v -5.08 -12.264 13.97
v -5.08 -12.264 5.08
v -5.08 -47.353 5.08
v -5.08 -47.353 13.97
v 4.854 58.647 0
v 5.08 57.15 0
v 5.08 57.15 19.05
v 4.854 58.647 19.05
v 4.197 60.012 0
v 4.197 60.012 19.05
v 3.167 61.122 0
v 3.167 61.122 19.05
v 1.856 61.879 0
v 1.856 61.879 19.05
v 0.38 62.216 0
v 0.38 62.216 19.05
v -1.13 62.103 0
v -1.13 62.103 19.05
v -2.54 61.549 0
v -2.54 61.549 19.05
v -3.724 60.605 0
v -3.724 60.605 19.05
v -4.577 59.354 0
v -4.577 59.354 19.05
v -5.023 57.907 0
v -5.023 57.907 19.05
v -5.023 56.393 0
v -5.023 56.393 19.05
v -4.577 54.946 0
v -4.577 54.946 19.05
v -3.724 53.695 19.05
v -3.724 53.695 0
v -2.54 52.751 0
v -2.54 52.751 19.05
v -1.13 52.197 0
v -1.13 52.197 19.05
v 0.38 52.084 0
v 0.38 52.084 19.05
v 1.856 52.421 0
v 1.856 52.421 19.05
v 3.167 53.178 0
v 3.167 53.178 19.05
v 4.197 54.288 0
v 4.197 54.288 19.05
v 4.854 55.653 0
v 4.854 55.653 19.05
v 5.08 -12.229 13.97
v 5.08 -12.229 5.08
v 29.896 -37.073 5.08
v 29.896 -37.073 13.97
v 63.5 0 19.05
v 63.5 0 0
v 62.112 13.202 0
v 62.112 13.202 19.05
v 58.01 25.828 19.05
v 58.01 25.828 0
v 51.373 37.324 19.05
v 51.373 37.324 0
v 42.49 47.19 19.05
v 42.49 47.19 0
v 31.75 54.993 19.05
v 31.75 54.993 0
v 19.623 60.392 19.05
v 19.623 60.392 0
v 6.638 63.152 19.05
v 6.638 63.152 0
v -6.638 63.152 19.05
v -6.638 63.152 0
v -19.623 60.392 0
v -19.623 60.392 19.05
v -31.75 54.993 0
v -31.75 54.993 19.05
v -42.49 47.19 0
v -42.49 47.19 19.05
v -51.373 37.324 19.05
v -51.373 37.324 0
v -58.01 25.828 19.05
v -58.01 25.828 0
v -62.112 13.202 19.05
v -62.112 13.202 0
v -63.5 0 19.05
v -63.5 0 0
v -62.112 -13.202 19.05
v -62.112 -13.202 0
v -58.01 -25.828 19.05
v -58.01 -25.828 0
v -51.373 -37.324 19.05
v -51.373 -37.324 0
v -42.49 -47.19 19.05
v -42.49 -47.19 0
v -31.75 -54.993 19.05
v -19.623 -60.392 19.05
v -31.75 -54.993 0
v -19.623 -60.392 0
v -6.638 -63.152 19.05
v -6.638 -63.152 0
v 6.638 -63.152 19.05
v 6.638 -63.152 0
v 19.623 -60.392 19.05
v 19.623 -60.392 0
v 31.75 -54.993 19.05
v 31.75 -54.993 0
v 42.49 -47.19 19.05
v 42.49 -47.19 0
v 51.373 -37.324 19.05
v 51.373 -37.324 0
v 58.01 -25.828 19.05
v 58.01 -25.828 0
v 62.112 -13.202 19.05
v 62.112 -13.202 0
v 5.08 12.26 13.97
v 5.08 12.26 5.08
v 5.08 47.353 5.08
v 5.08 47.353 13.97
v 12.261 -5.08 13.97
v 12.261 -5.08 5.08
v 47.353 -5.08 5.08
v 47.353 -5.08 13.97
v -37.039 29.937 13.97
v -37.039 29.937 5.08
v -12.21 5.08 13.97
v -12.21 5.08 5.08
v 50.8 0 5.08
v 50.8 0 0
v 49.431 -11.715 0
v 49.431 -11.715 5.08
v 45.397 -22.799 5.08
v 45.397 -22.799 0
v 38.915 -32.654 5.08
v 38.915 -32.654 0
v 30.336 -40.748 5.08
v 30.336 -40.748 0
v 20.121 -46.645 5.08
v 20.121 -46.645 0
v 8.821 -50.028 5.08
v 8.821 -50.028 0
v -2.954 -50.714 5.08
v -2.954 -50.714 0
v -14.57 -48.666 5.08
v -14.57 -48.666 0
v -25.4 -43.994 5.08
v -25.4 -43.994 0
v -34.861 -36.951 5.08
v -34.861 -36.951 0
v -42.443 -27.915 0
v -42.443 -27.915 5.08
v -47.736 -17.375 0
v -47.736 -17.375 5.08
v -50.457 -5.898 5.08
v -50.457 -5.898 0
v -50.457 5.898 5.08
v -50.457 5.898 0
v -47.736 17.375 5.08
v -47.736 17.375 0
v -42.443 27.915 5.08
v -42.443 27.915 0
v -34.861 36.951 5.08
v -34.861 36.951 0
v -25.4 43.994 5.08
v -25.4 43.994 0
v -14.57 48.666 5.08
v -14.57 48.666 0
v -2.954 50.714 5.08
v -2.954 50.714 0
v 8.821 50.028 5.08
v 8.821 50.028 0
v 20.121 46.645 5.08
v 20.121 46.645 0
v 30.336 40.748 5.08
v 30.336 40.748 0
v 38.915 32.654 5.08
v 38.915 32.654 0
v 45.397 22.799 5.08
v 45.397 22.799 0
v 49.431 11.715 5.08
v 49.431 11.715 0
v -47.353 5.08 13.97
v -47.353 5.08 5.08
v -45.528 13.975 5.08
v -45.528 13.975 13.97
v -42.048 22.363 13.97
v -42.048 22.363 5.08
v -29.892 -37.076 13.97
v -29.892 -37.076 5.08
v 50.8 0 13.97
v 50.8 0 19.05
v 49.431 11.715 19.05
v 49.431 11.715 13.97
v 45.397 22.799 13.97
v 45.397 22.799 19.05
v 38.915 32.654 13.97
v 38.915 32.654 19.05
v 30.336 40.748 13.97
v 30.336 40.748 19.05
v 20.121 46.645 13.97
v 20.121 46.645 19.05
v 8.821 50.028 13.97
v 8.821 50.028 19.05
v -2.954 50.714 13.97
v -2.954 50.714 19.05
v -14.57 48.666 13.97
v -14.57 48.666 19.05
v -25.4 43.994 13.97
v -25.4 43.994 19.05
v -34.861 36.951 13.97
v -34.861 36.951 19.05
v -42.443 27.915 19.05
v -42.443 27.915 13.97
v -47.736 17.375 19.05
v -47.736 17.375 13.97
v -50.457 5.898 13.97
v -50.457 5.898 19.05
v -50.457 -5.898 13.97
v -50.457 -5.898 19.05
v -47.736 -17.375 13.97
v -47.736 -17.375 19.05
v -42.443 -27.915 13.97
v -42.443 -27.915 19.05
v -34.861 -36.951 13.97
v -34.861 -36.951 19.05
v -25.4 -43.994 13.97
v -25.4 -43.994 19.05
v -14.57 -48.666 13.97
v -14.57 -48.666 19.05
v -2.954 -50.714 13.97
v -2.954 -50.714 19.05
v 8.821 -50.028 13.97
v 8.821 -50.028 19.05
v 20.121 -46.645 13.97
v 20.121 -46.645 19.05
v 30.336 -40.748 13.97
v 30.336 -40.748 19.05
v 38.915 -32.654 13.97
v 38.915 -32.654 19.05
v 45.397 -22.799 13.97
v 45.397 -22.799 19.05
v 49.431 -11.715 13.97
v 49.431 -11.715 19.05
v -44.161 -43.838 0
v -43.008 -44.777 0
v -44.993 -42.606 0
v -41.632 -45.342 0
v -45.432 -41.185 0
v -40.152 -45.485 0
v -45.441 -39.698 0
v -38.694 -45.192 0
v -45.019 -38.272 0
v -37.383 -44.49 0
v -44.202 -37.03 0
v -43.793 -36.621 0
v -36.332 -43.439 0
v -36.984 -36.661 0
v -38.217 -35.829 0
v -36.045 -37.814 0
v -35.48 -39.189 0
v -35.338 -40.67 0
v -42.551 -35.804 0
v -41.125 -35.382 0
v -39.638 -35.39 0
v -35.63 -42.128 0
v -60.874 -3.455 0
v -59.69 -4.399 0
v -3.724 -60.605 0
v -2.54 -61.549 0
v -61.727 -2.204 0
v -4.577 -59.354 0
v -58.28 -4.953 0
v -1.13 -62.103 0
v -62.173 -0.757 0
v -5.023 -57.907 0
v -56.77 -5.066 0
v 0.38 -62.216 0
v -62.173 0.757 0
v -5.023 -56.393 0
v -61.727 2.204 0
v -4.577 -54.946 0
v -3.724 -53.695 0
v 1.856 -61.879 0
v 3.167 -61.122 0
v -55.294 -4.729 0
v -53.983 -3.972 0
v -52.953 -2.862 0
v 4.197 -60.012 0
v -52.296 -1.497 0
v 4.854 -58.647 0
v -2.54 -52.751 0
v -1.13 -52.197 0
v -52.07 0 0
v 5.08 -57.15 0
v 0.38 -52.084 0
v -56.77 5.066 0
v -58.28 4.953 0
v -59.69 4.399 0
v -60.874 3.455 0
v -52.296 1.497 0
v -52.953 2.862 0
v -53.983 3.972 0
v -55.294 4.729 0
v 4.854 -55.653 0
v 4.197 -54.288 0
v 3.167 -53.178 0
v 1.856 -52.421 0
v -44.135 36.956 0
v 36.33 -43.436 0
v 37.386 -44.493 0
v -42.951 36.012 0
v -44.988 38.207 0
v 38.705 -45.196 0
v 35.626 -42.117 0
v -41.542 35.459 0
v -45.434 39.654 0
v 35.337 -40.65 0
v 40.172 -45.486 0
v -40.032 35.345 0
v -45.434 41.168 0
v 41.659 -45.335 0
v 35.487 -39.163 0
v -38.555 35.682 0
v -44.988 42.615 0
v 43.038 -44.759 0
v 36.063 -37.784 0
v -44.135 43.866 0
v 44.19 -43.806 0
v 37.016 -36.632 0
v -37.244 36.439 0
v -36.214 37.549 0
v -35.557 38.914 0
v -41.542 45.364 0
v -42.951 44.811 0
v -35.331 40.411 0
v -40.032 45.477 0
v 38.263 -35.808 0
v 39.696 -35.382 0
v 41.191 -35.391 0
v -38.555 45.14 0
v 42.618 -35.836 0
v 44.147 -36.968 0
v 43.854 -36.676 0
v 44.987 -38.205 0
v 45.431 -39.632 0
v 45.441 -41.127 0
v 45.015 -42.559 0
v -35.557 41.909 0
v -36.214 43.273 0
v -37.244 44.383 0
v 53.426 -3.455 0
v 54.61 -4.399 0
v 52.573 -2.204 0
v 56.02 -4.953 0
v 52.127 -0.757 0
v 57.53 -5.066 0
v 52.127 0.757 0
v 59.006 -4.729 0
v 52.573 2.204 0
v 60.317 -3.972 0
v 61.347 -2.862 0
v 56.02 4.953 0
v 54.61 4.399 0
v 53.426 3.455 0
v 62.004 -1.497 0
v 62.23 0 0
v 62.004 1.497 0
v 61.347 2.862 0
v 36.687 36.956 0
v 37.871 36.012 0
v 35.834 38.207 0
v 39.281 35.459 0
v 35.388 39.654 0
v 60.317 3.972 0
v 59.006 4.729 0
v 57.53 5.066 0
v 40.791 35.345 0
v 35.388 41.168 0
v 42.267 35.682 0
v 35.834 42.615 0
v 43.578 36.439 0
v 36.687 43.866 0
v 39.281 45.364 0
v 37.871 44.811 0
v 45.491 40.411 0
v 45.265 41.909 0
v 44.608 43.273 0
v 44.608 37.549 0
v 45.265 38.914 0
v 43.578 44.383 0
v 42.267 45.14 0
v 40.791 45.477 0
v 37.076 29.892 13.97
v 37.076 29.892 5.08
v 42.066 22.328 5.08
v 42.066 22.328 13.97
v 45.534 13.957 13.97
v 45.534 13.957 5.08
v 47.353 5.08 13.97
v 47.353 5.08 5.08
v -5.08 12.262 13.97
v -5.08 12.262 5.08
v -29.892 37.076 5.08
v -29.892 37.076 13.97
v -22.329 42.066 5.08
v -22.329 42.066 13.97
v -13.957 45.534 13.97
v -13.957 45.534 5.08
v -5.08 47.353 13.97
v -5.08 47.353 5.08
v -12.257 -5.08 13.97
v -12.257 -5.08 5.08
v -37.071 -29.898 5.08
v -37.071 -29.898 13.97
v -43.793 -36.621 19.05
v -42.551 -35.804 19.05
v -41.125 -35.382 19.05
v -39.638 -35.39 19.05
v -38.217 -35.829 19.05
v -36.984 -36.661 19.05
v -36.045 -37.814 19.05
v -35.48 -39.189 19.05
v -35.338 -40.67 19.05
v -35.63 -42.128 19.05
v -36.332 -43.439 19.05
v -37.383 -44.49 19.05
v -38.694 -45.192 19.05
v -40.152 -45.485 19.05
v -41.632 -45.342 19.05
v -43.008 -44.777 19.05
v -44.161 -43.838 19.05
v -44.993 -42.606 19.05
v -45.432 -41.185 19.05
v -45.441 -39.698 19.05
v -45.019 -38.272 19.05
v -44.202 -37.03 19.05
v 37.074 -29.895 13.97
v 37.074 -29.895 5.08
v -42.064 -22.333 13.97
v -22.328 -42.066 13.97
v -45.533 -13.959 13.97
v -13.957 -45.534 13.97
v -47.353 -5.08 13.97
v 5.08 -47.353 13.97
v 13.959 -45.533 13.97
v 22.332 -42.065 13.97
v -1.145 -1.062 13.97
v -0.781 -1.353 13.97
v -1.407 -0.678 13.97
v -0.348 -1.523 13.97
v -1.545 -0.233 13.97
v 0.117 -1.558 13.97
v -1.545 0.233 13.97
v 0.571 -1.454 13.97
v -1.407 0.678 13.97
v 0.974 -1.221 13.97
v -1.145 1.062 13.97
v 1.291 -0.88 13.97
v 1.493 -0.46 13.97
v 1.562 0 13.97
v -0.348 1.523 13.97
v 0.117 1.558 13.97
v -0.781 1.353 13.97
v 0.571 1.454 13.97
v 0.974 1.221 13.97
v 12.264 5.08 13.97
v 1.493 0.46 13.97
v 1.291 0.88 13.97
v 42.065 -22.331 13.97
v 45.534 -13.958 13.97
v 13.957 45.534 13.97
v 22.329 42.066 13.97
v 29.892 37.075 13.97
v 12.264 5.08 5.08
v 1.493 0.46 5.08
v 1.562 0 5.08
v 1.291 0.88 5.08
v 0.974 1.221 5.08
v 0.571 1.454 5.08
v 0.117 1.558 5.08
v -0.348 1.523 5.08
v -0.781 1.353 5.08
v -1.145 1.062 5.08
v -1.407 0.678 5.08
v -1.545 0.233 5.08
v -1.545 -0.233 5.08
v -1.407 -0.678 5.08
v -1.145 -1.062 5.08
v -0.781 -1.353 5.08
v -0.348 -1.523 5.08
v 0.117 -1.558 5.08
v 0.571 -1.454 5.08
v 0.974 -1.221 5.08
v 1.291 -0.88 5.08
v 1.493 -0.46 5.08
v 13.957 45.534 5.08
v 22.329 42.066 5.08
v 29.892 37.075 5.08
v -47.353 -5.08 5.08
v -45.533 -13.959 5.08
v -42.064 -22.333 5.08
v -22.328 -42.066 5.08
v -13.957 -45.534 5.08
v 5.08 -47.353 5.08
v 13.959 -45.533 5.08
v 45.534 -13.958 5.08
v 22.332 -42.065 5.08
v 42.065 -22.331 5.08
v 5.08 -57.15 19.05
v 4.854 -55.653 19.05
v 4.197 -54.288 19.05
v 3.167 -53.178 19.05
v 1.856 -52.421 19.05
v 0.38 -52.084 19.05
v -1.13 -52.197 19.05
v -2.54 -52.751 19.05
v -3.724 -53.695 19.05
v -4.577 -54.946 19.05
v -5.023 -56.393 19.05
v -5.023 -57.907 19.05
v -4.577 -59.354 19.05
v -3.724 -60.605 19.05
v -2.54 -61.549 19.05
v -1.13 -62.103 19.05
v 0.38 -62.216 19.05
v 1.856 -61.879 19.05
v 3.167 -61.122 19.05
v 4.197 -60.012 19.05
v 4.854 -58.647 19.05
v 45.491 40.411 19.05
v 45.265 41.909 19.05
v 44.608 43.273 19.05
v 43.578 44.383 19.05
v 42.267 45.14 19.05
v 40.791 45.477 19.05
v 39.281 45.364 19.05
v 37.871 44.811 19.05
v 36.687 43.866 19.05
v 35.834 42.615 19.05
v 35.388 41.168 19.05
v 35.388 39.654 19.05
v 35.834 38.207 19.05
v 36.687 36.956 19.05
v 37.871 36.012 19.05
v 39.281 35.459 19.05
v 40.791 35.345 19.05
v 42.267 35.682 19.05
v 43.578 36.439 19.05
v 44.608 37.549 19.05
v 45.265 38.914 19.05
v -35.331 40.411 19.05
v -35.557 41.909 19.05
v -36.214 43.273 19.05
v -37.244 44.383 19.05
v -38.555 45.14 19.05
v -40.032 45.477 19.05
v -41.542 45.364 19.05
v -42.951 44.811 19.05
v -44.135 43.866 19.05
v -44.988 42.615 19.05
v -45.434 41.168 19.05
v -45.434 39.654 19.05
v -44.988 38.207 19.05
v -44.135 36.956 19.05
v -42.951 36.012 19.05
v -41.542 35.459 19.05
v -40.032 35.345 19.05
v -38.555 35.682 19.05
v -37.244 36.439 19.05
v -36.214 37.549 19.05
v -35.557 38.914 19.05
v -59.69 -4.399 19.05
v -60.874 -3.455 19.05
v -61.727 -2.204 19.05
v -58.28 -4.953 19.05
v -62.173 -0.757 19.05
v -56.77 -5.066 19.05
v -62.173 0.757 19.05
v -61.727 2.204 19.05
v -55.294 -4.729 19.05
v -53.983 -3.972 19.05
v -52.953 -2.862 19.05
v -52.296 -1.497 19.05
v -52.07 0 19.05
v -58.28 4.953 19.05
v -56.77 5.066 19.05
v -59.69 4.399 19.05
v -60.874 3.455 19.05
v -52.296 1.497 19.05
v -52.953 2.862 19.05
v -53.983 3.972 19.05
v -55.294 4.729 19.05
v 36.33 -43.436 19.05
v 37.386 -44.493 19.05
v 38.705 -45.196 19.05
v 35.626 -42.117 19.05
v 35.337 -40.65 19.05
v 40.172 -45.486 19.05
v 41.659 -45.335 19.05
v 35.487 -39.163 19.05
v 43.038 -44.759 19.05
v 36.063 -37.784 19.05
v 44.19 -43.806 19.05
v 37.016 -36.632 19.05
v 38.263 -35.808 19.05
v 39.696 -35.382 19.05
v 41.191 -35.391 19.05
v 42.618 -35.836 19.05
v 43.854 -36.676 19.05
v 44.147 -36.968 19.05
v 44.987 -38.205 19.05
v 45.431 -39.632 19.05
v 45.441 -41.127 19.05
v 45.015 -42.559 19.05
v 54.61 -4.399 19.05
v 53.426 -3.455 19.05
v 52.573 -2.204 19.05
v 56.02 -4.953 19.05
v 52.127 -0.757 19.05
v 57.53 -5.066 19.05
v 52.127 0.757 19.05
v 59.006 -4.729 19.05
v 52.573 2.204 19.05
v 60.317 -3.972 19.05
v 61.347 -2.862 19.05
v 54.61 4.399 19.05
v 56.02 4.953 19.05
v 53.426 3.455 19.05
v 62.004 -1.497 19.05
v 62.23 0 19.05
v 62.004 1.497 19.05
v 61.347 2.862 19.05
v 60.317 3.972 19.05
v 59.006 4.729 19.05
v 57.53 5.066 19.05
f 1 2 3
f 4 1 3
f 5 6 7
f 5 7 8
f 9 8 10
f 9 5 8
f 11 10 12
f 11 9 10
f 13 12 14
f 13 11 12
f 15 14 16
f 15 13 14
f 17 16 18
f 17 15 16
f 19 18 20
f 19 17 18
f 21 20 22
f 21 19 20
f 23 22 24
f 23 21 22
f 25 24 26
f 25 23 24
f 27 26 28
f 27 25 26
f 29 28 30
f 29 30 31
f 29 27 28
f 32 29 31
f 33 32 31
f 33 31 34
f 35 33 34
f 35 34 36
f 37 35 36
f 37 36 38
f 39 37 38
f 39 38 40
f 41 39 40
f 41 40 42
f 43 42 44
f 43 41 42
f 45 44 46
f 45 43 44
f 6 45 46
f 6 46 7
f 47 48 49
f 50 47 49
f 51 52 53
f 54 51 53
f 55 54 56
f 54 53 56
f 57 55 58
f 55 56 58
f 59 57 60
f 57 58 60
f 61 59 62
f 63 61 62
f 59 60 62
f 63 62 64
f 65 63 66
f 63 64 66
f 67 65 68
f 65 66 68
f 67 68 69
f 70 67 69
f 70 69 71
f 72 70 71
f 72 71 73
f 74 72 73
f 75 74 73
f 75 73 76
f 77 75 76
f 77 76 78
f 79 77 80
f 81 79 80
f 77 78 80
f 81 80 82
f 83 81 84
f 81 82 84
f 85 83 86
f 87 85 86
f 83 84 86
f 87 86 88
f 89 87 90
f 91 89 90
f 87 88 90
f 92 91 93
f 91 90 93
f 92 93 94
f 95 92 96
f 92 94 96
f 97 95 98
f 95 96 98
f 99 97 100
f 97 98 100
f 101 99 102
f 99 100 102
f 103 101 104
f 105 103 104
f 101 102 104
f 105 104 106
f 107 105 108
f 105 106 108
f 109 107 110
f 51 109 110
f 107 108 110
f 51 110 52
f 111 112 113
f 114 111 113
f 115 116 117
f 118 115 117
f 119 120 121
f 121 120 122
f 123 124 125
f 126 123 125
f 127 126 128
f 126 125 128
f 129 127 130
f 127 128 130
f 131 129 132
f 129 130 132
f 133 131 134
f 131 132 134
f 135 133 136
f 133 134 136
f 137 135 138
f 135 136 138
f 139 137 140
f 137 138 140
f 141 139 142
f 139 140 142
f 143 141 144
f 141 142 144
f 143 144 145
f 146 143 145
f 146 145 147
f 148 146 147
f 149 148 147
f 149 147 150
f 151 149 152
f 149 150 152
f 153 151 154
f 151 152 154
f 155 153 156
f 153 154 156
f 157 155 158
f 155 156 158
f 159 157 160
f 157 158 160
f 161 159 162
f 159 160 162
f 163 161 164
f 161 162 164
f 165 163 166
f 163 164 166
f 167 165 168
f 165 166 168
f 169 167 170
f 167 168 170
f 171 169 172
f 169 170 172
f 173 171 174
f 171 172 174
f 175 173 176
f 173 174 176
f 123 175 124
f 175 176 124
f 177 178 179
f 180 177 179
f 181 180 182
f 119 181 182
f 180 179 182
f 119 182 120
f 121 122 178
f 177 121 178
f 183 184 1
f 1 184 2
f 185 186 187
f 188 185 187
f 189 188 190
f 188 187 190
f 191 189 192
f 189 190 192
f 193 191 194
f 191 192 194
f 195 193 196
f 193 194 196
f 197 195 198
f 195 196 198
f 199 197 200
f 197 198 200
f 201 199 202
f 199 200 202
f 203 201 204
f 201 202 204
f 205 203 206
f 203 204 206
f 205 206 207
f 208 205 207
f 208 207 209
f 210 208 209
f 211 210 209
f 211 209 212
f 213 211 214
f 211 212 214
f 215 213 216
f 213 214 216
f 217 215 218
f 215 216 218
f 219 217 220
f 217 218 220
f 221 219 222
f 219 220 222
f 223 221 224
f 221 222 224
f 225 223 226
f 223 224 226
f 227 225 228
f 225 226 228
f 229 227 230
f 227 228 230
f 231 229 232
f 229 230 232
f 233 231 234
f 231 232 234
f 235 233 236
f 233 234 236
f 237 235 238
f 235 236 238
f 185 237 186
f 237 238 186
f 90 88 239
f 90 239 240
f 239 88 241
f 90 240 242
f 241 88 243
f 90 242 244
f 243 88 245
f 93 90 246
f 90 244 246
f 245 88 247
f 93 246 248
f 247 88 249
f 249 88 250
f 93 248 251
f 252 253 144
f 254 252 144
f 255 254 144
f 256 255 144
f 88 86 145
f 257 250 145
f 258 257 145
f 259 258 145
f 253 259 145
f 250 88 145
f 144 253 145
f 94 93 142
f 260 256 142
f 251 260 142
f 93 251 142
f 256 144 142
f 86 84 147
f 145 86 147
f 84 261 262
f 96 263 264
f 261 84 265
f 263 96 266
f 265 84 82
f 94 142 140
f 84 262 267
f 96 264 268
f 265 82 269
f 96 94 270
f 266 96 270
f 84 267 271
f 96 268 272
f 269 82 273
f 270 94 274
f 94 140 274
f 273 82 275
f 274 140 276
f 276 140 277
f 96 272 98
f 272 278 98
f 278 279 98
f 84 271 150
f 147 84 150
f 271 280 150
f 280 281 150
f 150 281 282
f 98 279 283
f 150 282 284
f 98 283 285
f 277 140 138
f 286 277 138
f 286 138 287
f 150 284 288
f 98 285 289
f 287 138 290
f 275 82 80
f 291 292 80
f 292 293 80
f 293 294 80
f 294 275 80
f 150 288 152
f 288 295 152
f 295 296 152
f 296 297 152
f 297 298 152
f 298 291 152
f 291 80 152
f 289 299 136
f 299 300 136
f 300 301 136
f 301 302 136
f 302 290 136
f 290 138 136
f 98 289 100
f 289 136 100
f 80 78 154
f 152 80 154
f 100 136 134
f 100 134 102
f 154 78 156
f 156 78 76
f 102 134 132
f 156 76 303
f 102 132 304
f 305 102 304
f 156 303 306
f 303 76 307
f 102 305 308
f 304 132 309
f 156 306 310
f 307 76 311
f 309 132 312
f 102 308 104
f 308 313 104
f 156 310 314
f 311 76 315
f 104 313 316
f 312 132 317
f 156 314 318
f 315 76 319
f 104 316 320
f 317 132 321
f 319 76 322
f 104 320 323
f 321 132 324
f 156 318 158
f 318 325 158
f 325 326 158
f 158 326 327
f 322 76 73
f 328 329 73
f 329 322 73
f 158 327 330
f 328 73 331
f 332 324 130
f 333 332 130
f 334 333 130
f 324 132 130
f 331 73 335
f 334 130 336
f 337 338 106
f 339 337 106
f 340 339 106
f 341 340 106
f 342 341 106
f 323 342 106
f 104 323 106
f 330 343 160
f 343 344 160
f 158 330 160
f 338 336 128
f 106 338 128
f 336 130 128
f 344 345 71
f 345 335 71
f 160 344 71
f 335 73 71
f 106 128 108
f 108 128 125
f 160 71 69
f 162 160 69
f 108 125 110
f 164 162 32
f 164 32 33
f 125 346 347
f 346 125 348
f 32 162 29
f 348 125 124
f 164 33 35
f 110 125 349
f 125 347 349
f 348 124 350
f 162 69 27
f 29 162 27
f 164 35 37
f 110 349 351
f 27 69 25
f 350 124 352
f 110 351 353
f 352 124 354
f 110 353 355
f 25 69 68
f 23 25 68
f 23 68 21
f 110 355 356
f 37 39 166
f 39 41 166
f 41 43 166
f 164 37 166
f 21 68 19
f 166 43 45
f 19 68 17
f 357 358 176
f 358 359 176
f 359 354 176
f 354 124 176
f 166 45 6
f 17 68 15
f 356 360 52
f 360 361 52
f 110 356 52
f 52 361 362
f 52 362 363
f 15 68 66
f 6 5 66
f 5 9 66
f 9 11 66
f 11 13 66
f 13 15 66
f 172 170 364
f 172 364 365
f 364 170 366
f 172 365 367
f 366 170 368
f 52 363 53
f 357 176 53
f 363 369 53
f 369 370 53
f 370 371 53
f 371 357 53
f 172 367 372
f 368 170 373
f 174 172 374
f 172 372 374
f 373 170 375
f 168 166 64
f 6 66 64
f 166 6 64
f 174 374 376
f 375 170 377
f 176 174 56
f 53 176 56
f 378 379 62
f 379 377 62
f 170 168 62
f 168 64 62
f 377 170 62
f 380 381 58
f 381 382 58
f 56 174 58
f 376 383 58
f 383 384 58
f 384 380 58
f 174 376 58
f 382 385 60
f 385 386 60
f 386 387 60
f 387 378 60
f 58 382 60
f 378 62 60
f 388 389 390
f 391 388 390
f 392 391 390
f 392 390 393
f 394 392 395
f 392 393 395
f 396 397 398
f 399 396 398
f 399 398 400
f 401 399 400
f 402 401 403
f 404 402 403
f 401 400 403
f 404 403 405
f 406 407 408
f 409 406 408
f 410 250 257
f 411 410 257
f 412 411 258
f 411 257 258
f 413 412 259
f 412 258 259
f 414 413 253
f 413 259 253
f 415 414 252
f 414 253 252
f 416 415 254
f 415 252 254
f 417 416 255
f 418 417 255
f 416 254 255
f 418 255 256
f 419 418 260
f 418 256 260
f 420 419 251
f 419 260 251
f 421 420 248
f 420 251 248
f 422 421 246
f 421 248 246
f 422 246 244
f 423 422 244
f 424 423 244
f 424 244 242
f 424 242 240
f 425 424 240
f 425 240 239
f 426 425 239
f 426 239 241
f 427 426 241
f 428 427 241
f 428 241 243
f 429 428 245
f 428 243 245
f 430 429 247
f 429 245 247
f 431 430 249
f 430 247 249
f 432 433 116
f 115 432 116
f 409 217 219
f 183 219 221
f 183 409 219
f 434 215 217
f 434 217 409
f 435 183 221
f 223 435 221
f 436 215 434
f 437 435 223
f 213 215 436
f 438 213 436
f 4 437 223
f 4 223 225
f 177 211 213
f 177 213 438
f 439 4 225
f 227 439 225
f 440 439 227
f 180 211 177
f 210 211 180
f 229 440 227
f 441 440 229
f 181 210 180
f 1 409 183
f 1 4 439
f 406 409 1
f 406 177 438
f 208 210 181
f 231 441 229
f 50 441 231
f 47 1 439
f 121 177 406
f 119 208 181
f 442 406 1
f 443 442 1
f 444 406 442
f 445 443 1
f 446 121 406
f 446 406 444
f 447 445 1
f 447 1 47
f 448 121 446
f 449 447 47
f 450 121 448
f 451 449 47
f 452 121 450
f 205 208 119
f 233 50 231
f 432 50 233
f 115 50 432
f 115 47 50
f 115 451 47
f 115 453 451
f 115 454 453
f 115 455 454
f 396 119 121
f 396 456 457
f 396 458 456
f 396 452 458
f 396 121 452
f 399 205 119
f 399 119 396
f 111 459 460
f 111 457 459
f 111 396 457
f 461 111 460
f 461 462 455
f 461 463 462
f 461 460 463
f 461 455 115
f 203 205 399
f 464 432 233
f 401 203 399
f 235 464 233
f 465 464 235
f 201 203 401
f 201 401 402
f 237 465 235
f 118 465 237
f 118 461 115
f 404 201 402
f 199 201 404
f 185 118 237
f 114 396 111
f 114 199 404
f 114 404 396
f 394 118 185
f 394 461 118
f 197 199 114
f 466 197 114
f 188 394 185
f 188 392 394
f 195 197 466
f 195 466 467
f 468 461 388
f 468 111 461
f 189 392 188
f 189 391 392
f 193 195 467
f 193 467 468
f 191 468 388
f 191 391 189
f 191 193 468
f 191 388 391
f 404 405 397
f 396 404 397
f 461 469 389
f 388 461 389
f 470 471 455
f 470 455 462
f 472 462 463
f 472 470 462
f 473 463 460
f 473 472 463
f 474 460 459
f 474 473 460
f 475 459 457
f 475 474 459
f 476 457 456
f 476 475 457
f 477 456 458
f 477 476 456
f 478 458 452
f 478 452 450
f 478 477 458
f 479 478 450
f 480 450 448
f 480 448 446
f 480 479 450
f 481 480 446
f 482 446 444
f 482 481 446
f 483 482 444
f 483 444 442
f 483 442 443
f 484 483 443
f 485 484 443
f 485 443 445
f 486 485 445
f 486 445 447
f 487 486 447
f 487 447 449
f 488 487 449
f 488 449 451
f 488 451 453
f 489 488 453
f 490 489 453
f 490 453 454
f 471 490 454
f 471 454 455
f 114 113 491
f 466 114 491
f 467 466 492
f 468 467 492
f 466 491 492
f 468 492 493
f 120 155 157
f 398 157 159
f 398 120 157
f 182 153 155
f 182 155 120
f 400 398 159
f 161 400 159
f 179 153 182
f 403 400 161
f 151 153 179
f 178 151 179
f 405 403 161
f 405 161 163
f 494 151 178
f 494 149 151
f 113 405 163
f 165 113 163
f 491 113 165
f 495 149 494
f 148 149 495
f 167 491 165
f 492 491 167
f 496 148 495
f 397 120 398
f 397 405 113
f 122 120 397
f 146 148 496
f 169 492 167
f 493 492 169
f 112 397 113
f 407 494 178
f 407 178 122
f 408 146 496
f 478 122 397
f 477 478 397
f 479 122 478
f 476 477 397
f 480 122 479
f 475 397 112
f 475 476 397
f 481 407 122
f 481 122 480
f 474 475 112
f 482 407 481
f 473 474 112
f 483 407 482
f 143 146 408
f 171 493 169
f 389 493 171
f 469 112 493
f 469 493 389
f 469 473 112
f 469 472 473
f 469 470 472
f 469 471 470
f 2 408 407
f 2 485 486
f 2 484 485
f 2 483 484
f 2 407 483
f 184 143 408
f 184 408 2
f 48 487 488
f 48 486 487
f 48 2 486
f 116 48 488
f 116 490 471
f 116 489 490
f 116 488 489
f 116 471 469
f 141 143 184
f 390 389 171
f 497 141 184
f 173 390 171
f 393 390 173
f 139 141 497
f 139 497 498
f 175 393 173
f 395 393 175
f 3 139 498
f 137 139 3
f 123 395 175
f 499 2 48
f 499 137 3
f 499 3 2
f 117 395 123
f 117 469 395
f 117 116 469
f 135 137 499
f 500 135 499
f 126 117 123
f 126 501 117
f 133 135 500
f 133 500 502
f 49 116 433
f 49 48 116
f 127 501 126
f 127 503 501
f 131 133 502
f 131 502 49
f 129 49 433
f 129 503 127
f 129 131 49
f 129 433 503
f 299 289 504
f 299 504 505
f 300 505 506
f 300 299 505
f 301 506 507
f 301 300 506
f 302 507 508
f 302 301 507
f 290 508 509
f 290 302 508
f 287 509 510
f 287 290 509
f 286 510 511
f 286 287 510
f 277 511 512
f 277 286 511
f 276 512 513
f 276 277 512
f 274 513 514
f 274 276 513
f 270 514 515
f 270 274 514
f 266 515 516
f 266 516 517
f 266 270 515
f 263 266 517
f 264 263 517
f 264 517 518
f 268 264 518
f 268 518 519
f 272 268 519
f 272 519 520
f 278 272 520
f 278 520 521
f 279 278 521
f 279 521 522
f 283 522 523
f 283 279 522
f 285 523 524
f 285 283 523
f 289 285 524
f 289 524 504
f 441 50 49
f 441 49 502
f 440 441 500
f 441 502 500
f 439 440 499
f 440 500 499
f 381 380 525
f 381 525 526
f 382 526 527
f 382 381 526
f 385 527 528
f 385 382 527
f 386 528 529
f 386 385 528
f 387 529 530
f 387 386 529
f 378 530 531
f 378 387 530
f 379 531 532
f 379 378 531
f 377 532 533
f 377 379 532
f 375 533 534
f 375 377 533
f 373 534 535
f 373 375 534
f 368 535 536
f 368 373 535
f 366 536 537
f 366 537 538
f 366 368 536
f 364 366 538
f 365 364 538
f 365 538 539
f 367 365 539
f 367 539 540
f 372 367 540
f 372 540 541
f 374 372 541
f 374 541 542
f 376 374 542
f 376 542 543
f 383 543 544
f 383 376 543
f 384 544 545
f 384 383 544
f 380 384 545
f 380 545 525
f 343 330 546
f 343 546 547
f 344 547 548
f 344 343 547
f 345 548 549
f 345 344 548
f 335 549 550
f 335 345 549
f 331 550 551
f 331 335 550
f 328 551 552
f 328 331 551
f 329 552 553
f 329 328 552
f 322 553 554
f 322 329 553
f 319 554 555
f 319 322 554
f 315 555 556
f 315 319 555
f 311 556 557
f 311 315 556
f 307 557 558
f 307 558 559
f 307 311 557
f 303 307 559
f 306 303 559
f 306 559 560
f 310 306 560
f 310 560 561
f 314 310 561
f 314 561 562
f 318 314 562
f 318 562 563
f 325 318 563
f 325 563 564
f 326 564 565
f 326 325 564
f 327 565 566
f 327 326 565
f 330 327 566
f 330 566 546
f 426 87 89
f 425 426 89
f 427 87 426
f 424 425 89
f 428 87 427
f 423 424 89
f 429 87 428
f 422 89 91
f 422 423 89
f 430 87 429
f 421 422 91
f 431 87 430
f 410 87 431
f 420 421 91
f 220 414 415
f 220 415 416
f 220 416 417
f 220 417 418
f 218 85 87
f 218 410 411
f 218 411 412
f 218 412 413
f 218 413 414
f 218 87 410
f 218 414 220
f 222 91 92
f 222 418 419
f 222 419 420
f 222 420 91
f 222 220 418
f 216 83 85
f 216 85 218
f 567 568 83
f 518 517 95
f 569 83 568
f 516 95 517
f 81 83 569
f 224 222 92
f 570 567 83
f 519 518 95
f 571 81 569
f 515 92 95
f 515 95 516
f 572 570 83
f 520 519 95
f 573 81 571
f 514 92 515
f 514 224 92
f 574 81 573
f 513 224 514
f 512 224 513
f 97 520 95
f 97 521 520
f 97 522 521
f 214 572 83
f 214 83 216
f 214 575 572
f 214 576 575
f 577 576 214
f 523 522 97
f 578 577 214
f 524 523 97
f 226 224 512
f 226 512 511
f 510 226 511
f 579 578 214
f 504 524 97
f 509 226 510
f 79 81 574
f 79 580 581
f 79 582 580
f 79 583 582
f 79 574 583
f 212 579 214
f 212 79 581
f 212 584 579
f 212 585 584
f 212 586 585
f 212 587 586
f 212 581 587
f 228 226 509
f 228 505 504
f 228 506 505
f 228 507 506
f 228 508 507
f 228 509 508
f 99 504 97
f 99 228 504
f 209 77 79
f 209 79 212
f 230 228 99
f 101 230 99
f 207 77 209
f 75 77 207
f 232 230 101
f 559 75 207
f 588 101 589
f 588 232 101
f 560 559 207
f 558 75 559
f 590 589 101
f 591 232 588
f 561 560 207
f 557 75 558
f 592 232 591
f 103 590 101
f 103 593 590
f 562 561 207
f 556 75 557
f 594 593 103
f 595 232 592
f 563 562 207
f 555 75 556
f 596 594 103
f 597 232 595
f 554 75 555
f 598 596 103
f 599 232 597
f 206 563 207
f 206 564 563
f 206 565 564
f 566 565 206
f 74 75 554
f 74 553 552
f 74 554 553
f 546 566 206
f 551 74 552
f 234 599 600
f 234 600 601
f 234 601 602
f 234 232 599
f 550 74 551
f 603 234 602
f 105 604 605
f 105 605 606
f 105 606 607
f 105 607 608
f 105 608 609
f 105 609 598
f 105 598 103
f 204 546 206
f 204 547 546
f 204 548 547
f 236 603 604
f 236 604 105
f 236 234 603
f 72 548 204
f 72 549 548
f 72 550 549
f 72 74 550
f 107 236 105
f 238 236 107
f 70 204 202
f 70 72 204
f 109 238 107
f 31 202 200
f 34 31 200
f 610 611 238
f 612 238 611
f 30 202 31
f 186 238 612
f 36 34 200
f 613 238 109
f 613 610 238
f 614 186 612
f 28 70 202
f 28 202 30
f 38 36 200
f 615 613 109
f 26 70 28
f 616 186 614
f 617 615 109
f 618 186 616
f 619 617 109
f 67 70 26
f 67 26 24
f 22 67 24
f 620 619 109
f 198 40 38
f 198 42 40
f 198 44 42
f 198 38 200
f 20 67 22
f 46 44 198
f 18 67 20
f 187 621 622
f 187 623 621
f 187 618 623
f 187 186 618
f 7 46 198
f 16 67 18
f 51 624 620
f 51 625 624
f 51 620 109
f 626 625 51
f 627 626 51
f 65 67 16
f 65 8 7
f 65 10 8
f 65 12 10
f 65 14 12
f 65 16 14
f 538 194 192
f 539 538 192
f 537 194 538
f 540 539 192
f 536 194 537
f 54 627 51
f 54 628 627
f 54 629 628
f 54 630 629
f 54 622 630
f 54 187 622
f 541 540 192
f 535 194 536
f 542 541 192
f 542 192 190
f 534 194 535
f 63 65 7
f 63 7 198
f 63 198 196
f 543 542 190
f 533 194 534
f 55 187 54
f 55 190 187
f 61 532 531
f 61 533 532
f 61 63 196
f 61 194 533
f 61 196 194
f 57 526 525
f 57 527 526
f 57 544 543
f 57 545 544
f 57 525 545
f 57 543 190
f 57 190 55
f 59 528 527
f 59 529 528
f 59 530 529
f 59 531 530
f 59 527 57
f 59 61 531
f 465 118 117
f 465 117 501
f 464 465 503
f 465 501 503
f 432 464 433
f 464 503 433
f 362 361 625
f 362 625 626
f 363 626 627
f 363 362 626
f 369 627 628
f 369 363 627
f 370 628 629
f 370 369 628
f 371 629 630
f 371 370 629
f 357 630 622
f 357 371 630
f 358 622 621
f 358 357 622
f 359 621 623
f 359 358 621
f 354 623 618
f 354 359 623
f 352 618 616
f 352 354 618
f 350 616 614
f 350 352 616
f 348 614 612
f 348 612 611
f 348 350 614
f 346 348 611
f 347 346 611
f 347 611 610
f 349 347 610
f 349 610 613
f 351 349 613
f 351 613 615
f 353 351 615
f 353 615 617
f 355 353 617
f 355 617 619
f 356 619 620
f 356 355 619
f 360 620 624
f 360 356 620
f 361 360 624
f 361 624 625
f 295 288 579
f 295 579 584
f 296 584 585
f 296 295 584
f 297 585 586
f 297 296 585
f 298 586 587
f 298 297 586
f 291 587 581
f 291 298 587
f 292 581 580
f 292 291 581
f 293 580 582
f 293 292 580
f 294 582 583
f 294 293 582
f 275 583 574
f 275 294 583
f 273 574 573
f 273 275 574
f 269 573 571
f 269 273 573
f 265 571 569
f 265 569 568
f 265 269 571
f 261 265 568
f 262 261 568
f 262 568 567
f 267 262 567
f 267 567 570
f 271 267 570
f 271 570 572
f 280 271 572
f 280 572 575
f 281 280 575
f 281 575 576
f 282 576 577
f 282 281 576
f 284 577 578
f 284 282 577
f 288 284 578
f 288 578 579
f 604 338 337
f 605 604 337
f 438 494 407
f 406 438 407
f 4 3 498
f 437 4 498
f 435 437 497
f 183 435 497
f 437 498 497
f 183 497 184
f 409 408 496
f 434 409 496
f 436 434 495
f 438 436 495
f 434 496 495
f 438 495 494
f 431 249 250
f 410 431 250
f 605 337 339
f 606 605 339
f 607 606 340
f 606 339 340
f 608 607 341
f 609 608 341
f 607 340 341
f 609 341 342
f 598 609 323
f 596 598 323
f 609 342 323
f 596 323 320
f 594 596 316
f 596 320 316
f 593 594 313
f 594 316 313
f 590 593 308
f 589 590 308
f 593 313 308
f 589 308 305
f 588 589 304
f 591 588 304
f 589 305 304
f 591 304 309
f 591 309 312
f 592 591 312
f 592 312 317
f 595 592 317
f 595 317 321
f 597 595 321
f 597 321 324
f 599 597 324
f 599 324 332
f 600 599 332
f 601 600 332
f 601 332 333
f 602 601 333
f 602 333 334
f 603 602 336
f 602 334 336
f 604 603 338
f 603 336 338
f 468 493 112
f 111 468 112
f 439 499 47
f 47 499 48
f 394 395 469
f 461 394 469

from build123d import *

# Parameters (mm, degrees)
F0_R     = 63.5
F0_R_2   = 5.08
F0_R_3   = 1.5621
F1_DEPTH = 19.05
F2_R     = 50.8
F2_R_2   = 1.5621
F3_DEPTH = 5.08
F4_R     = 50.8
F4_R_2   = 1.5621
F5_DEPTH = 5.08


with BuildPart() as f1:
    # F0 (on Top) → F1 (new body)
    with BuildSketch(Plane.XY):
        Circle(F0_R)
        with BuildLine():
            ThreePointArc((-43.7932900831, -36.6206979979), (-36.8187913893, -44.0029962675), (-44.2020942404, -37.0295610466))
            Line((-44.2020942404, -37.0295610466), (-43.7932900831, -36.6206979979))
        make_face(mode=Mode.SUBTRACT)
        with BuildLine():
            Line((-5.08, -12.2641944787), (-5.08, -47.3532915963))
            Line((-5.08, -47.3532915963), (-5.08, -50.545361805))
            ThreePointArc((-5.08, -50.545361805), (-19.4403188674, -46.9330800431), (-32.1488664849, -39.3330698488))
            Line((-32.1488664849, -39.3330698488), (-29.8917324097, -37.0759350327))
            Line((-29.8917324097, -37.0759350327), (-5.08, -12.2641944787))
        make_face(mode=Mode.SUBTRACT)
        with BuildLine():
            ThreePointArc((-39.328136569, -32.154901244), (-46.9315884756, -19.4439194393), (-50.545361805, -5.08))
            Line((-50.545361805, -5.08), (-47.3532915963, -5.08))
            Line((-47.3532915963, -5.08), (-12.2571351119, -5.08))
            Line((-12.2571351119, -5.08), (-37.0711843605, -29.8976239041))
            Line((-37.0711843605, -29.8976239041), (-39.328136569, -32.154901244))
        make_face(mode=Mode.SUBTRACT)
        with Locations((0, -57.15)):
            Circle(F0_R_2, mode=Mode.SUBTRACT)
        with BuildLine():
            ThreePointArc((44.1465586521, -36.9683134237), (36.8189179009, -44.0031227929), (43.8542666003, -36.675999857))
            Line((43.8542666003, -36.675999857), (44.1465586521, -36.9683134237))
        make_face(mode=Mode.SUBTRACT)
        with BuildLine():
            ThreePointArc((32.151702841, -39.3307513839), (19.4420111057, -46.9323790593), (5.08, -50.545361805))
            Line((5.08, -50.545361805), (5.08, -47.3532915963))
            Line((5.08, -47.3532915963), (5.08, -12.2291341303))
            Line((5.08, -12.2291341303), (29.8959656944, -37.0725216326))
            Line((29.8959656944, -37.0725216326), (32.151702841, -39.3307513839))
        make_face(mode=Mode.SUBTRACT)
        with BuildLine():
            ThreePointArc((50.545361805, -5.08), (46.9323180233, -19.4421584439), (39.3305495108, -32.1519497882))
            Line((39.3305495108, -32.1519497882), (37.0735081629, -29.8947423052))
            Line((37.0735081629, -29.8947423052), (12.2605922736, -5.08))
            Line((12.2605922736, -5.08), (47.3532915963, -5.08))
            Line((47.3532915963, -5.08), (50.545361805, -5.08))
        make_face(mode=Mode.SUBTRACT)
        with Locations((-57.15, 0)):
            Circle(F0_R_2, mode=Mode.SUBTRACT)
        with BuildLine():
            ThreePointArc((-50.545361805, 5.08), (-46.921636061, 19.4679241152), (-39.2952191809, 32.1951199645))
            Line((-39.2952191809, 32.1951199645), (-37.0394820342, 29.9368902132))
            Line((-37.0394820342, 29.9368902132), (-12.2100285331, 5.08))
            Line((-12.2100285331, 5.08), (-47.3532915963, 5.08))
            Line((-47.3532915963, 5.08), (-50.545361805, 5.08))
        make_face(mode=Mode.SUBTRACT)
        with BuildLine():
            ThreePointArc((-32.1490547855, 39.3329159407), (-19.4404312097, 46.9330335092), (-5.08, 50.545361805))
            Line((-5.08, 50.545361805), (-5.08, 47.3532915963))
            Line((-5.08, 47.3532915963), (-5.08, 12.2618686706))
            Line((-5.08, 12.2618686706), (-29.8920134376, 37.0757084577))
            Line((-29.8920134376, 37.0757084577), (-32.1490547855, 39.3329159407))
        make_face(mode=Mode.SUBTRACT)
        with Locations((-40.4111525448, 40.4111525448)):
            Circle(F0_R_2, mode=Mode.SUBTRACT)
        Circle(F0_R_3, mode=Mode.SUBTRACT)
        with BuildLine():
            ThreePointArc((39.3330592962, 32.1488793958), (46.9330768525, 19.4403265702), (50.545361805, 5.08))
            Line((50.545361805, 5.08), (47.3532915963, 5.08))
            Line((47.3532915963, 5.08), (12.2641887856, 5.08))
            Line((12.2641887856, 5.08), (37.0759252209, 29.8917445796))
            Line((37.0759252209, 29.8917445796), (39.3330592962, 32.1488793958))
        make_face(mode=Mode.SUBTRACT)
        with BuildLine():
            Line((29.8922835881, 37.0754906493), (5.08, 12.2596326602))
            Line((5.08, 12.2596326602), (5.08, 47.3532915963))
            Line((5.08, 47.3532915963), (5.08, 50.545361805))
            ThreePointArc((5.08, 50.545361805), (19.4405392034, 46.9329887764), (32.1492357966, 39.3327679892))
            Line((32.1492357966, 39.3327679892), (29.8922835881, 37.0754906493))
        make_face(mode=Mode.SUBTRACT)
        with Locations((57.15, 0)):
            Circle(F0_R_2, mode=Mode.SUBTRACT)
        with Locations((0, 57.15)):
            Circle(F0_R_2, mode=Mode.SUBTRACT)
        with Locations((40.4111525448, 40.4111525448)):
            Circle(F0_R_2, mode=Mode.SUBTRACT)
        with BuildLine():
            Line((-37.0394820342, 29.9368902132), (-39.2952191809, 32.1951199645))
            ThreePointArc((-39.2952191809, 32.1951199645), (-46.921636061, 19.4679241152), (-50.545361805, 5.08))
            Line((-50.545361805, 5.08), (-47.3532915963, 5.08))
            ThreePointArc((-47.3532915963, 5.08), (-43.9886497637, 18.2521044532), (-37.0394820342, 29.9368902132))
        make_face()
        with BuildLine():
            Line((-5.08, 47.3532915963), (-5.08, 50.545361805))
            ThreePointArc((-5.08, 50.545361805), (-19.4404312097, 46.9330335092), (-32.1490547855, 39.3329159407))
            Line((-32.1490547855, 39.3329159407), (-29.8920134376, 37.0757084577))
            ThreePointArc((-29.8920134376, 37.0757084577), (-18.2254659683, 43.9996933539), (-5.08, 47.3532915963))
        make_face()
        with BuildLine():
            Line((-47.3532915963, -5.08), (-50.545361805, -5.08))
            ThreePointArc((-50.545361805, -5.08), (-46.9315884756, -19.4439194393), (-39.328136569, -32.154901244))
            Line((-39.328136569, -32.154901244), (-37.0711843605, -29.8976239041))
            ThreePointArc((-37.0711843605, -29.8976239041), (-43.9983141632, -18.2287952371), (-47.3532915963, -5.08))
        make_face()
        with BuildLine():
            Line((-5.08, -50.545361805), (-5.08, -47.3532915963))
            ThreePointArc((-5.08, -47.3532915963), (-18.2252992134, -43.9997624264), (-29.8917324097, -37.0759350327))
            Line((-29.8917324097, -37.0759350327), (-32.1488664849, -39.3330698488))
            ThreePointArc((-32.1488664849, -39.3330698488), (-19.4403188674, -46.9330800431), (-5.08, -50.545361805))
        make_face()
        with BuildLine():
            Line((5.08, -47.3532915963), (5.08, -50.545361805))
            ThreePointArc((5.08, -50.545361805), (19.4420111057, -46.9323790593), (32.151702841, -39.3307513839))
            Line((32.151702841, -39.3307513839), (29.8959656944, -37.0725216326))
            ThreePointArc((29.8959656944, -37.0725216326), (18.2278112187, -43.9987218357), (5.08, -47.3532915963))
        make_face()
        with BuildLine():
            Line((37.0735081629, -29.8947423052), (39.3305495108, -32.1519497882))
            ThreePointArc((39.3305495108, -32.1519497882), (46.9323180233, -19.4421584439), (50.545361805, -5.08))
            Line((50.545361805, -5.08), (47.3532915963, -5.08))
            ThreePointArc((47.3532915963, -5.08), (43.9990225836, -18.2270852494), (37.0735081629, -29.8947423052))
        make_face()
        with BuildLine():
            Line((47.3532915963, 5.08), (50.545361805, 5.08))
            ThreePointArc((50.545361805, 5.08), (46.9330768525, 19.4403265702), (39.3330592962, 32.1488793958))
            Line((39.3330592962, 32.1488793958), (37.0759252209, 29.8917445796))
            ThreePointArc((37.0759252209, 29.8917445796), (43.9997594353, 18.2253064347), (47.3532915963, 5.08))
        make_face()
        with BuildLine():
            ThreePointArc((5.08, 47.3532915963), (18.2256262696, 43.9996269539), (29.8922835881, 37.0754906493))
            Line((29.8922835881, 37.0754906493), (32.1492357966, 39.3327679892))
            ThreePointArc((32.1492357966, 39.3327679892), (19.4405392034, 46.9329887764), (5.08, 50.545361805))
            Line((5.08, 50.545361805), (5.08, 47.3532915963))
        make_face()
    extrude(amount=F1_DEPTH)

    # F2 (on face) → F3 (cut)
    with BuildSketch(Plane(origin=(0, 0, 0), x_dir=(1, 0, 0), z_dir=(0, 0, -1))):
        Circle(F2_R)
        with BuildLine():
            Line((-29.8920134376, -37.0757084577), (-5.08, -12.2618686706))
            Line((-5.08, -12.2618686706), (-5.08, -47.3532915963))
            ThreePointArc((-5.08, -47.3532915963), (-18.2254659683, -43.9996933539), (-29.8920134376, -37.0757084577))
        make_face(mode=Mode.SUBTRACT)
        with BuildLine():
            Line((-47.3532915963, -5.08), (-12.2100285331, -5.08))
            Line((-12.2100285331, -5.08), (-37.0394820342, -29.9368902132))
            ThreePointArc((-37.0394820342, -29.9368902132), (-43.9886497637, -18.2521044532), (-47.3532915963, -5.08))
        make_face(mode=Mode.SUBTRACT)
        with BuildLine():
            Line((5.08, -47.3532915963), (5.08, -12.2596326602))
            Line((5.08, -12.2596326602), (29.8922835881, -37.0754906493))
            ThreePointArc((29.8922835881, -37.0754906493), (18.2256262696, -43.9996269539), (5.08, -47.3532915963))
        make_face(mode=Mode.SUBTRACT)
        with BuildLine():
            Line((37.0759252209, -29.8917445796), (12.2641887856, -5.08))
            Line((12.2641887856, -5.08), (47.3532915963, -5.08))
            ThreePointArc((47.3532915963, -5.08), (43.9997594353, -18.2253064347), (37.0759252209, -29.8917445796))
        make_face(mode=Mode.SUBTRACT)
        with BuildLine():
            Line((-37.0711843605, 29.8976239041), (-12.2571351119, 5.08))
            Line((-12.2571351119, 5.08), (-47.3532915963, 5.08))
            ThreePointArc((-47.3532915963, 5.08), (-43.9983141632, 18.2287952371), (-37.0711843605, 29.8976239041))
        make_face(mode=Mode.SUBTRACT)
        with BuildLine():
            Line((-5.08, 47.3532915963), (-5.08, 12.2641944787))
            Line((-5.08, 12.2641944787), (-29.8917324097, 37.0759350327))
            ThreePointArc((-29.8917324097, 37.0759350327), (-18.2252992134, 43.9997624264), (-5.08, 47.3532915963))
        make_face(mode=Mode.SUBTRACT)
        Circle(F2_R_2, mode=Mode.SUBTRACT)
        with BuildLine():
            ThreePointArc((37.0735081629, 29.8947423052), (43.9990225836, 18.2270852494), (47.3532915963, 5.08))
            Line((47.3532915963, 5.08), (12.2605922736, 5.08))
            Line((12.2605922736, 5.08), (37.0735081629, 29.8947423052))
        make_face(mode=Mode.SUBTRACT)
        with BuildLine():
            Line((29.8959656944, 37.0725216326), (5.08, 12.2291341303))
            Line((5.08, 12.2291341303), (5.08, 47.3532915963))
            ThreePointArc((5.08, 47.3532915963), (18.2278112187, 43.9987218357), (29.8959656944, 37.0725216326))
        make_face(mode=Mode.SUBTRACT)
        Circle(F2_R_2)
    extrude(amount=-F3_DEPTH, mode=Mode.SUBTRACT)

    # F4 (on face) → F5 (cut)
    with BuildSketch(Plane.XY.offset(19.05)):
        Circle(F4_R)
        with BuildLine():
            ThreePointArc((-5.08, -47.3532915963), (-18.2252992134, -43.9997624264), (-29.8917324097, -37.0759350327))
            Line((-29.8917324097, -37.0759350327), (-5.08, -12.2641944787))
            Line((-5.08, -12.2641944787), (-5.08, -47.3532915963))
        make_face(mode=Mode.SUBTRACT)
        with BuildLine():
            ThreePointArc((-37.0711843605, -29.8976239041), (-43.9983141632, -18.2287952371), (-47.3532915963, -5.08))
            Line((-47.3532915963, -5.08), (-12.2571351119, -5.08))
            Line((-12.2571351119, -5.08), (-37.0711843605, -29.8976239041))
        make_face(mode=Mode.SUBTRACT)
        with BuildLine():
            ThreePointArc((29.8959656944, -37.0725216326), (18.2278112187, -43.9987218357), (5.08, -47.3532915963))
            Line((5.08, -47.3532915963), (5.08, -12.2291341303))
            Line((5.08, -12.2291341303), (29.8959656944, -37.0725216326))
        make_face(mode=Mode.SUBTRACT)
        with BuildLine():
            Line((37.0735081629, -29.8947423052), (12.2605922736, -5.08))
            Line((12.2605922736, -5.08), (47.3532915963, -5.08))
            ThreePointArc((47.3532915963, -5.08), (43.9990225836, -18.2270852494), (37.0735081629, -29.8947423052))
        make_face(mode=Mode.SUBTRACT)
        with BuildLine():
            ThreePointArc((-47.3532915963, 5.08), (-43.9886497637, 18.2521044532), (-37.0394820342, 29.9368902132))
            Line((-37.0394820342, 29.9368902132), (-12.2100285331, 5.08))
            Line((-12.2100285331, 5.08), (-47.3532915963, 5.08))
        make_face(mode=Mode.SUBTRACT)
        with BuildLine():
            ThreePointArc((-29.8920134376, 37.0757084577), (-18.2254659683, 43.9996933539), (-5.08, 47.3532915963))
            Line((-5.08, 47.3532915963), (-5.08, 12.2618686706))
            Line((-5.08, 12.2618686706), (-29.8920134376, 37.0757084577))
        make_face(mode=Mode.SUBTRACT)
        Circle(F4_R_2, mode=Mode.SUBTRACT)
        with BuildLine():
            ThreePointArc((37.0759252209, 29.8917445796), (43.9997594353, 18.2253064347), (47.3532915963, 5.08))
            Line((47.3532915963, 5.08), (12.2641887856, 5.08))
            Line((12.2641887856, 5.08), (37.0759252209, 29.8917445796))
        make_face(mode=Mode.SUBTRACT)
        with BuildLine():
            ThreePointArc((5.08, 47.3532915963), (18.2256262696, 43.9996269539), (29.8922835881, 37.0754906493))
            Line((29.8922835881, 37.0754906493), (5.08, 12.2596326602))
            Line((5.08, 12.2596326602), (5.08, 47.3532915963))
        make_face(mode=Mode.SUBTRACT)
    extrude(amount=-F5_DEPTH, mode=Mode.SUBTRACT)


solid = f1.part
